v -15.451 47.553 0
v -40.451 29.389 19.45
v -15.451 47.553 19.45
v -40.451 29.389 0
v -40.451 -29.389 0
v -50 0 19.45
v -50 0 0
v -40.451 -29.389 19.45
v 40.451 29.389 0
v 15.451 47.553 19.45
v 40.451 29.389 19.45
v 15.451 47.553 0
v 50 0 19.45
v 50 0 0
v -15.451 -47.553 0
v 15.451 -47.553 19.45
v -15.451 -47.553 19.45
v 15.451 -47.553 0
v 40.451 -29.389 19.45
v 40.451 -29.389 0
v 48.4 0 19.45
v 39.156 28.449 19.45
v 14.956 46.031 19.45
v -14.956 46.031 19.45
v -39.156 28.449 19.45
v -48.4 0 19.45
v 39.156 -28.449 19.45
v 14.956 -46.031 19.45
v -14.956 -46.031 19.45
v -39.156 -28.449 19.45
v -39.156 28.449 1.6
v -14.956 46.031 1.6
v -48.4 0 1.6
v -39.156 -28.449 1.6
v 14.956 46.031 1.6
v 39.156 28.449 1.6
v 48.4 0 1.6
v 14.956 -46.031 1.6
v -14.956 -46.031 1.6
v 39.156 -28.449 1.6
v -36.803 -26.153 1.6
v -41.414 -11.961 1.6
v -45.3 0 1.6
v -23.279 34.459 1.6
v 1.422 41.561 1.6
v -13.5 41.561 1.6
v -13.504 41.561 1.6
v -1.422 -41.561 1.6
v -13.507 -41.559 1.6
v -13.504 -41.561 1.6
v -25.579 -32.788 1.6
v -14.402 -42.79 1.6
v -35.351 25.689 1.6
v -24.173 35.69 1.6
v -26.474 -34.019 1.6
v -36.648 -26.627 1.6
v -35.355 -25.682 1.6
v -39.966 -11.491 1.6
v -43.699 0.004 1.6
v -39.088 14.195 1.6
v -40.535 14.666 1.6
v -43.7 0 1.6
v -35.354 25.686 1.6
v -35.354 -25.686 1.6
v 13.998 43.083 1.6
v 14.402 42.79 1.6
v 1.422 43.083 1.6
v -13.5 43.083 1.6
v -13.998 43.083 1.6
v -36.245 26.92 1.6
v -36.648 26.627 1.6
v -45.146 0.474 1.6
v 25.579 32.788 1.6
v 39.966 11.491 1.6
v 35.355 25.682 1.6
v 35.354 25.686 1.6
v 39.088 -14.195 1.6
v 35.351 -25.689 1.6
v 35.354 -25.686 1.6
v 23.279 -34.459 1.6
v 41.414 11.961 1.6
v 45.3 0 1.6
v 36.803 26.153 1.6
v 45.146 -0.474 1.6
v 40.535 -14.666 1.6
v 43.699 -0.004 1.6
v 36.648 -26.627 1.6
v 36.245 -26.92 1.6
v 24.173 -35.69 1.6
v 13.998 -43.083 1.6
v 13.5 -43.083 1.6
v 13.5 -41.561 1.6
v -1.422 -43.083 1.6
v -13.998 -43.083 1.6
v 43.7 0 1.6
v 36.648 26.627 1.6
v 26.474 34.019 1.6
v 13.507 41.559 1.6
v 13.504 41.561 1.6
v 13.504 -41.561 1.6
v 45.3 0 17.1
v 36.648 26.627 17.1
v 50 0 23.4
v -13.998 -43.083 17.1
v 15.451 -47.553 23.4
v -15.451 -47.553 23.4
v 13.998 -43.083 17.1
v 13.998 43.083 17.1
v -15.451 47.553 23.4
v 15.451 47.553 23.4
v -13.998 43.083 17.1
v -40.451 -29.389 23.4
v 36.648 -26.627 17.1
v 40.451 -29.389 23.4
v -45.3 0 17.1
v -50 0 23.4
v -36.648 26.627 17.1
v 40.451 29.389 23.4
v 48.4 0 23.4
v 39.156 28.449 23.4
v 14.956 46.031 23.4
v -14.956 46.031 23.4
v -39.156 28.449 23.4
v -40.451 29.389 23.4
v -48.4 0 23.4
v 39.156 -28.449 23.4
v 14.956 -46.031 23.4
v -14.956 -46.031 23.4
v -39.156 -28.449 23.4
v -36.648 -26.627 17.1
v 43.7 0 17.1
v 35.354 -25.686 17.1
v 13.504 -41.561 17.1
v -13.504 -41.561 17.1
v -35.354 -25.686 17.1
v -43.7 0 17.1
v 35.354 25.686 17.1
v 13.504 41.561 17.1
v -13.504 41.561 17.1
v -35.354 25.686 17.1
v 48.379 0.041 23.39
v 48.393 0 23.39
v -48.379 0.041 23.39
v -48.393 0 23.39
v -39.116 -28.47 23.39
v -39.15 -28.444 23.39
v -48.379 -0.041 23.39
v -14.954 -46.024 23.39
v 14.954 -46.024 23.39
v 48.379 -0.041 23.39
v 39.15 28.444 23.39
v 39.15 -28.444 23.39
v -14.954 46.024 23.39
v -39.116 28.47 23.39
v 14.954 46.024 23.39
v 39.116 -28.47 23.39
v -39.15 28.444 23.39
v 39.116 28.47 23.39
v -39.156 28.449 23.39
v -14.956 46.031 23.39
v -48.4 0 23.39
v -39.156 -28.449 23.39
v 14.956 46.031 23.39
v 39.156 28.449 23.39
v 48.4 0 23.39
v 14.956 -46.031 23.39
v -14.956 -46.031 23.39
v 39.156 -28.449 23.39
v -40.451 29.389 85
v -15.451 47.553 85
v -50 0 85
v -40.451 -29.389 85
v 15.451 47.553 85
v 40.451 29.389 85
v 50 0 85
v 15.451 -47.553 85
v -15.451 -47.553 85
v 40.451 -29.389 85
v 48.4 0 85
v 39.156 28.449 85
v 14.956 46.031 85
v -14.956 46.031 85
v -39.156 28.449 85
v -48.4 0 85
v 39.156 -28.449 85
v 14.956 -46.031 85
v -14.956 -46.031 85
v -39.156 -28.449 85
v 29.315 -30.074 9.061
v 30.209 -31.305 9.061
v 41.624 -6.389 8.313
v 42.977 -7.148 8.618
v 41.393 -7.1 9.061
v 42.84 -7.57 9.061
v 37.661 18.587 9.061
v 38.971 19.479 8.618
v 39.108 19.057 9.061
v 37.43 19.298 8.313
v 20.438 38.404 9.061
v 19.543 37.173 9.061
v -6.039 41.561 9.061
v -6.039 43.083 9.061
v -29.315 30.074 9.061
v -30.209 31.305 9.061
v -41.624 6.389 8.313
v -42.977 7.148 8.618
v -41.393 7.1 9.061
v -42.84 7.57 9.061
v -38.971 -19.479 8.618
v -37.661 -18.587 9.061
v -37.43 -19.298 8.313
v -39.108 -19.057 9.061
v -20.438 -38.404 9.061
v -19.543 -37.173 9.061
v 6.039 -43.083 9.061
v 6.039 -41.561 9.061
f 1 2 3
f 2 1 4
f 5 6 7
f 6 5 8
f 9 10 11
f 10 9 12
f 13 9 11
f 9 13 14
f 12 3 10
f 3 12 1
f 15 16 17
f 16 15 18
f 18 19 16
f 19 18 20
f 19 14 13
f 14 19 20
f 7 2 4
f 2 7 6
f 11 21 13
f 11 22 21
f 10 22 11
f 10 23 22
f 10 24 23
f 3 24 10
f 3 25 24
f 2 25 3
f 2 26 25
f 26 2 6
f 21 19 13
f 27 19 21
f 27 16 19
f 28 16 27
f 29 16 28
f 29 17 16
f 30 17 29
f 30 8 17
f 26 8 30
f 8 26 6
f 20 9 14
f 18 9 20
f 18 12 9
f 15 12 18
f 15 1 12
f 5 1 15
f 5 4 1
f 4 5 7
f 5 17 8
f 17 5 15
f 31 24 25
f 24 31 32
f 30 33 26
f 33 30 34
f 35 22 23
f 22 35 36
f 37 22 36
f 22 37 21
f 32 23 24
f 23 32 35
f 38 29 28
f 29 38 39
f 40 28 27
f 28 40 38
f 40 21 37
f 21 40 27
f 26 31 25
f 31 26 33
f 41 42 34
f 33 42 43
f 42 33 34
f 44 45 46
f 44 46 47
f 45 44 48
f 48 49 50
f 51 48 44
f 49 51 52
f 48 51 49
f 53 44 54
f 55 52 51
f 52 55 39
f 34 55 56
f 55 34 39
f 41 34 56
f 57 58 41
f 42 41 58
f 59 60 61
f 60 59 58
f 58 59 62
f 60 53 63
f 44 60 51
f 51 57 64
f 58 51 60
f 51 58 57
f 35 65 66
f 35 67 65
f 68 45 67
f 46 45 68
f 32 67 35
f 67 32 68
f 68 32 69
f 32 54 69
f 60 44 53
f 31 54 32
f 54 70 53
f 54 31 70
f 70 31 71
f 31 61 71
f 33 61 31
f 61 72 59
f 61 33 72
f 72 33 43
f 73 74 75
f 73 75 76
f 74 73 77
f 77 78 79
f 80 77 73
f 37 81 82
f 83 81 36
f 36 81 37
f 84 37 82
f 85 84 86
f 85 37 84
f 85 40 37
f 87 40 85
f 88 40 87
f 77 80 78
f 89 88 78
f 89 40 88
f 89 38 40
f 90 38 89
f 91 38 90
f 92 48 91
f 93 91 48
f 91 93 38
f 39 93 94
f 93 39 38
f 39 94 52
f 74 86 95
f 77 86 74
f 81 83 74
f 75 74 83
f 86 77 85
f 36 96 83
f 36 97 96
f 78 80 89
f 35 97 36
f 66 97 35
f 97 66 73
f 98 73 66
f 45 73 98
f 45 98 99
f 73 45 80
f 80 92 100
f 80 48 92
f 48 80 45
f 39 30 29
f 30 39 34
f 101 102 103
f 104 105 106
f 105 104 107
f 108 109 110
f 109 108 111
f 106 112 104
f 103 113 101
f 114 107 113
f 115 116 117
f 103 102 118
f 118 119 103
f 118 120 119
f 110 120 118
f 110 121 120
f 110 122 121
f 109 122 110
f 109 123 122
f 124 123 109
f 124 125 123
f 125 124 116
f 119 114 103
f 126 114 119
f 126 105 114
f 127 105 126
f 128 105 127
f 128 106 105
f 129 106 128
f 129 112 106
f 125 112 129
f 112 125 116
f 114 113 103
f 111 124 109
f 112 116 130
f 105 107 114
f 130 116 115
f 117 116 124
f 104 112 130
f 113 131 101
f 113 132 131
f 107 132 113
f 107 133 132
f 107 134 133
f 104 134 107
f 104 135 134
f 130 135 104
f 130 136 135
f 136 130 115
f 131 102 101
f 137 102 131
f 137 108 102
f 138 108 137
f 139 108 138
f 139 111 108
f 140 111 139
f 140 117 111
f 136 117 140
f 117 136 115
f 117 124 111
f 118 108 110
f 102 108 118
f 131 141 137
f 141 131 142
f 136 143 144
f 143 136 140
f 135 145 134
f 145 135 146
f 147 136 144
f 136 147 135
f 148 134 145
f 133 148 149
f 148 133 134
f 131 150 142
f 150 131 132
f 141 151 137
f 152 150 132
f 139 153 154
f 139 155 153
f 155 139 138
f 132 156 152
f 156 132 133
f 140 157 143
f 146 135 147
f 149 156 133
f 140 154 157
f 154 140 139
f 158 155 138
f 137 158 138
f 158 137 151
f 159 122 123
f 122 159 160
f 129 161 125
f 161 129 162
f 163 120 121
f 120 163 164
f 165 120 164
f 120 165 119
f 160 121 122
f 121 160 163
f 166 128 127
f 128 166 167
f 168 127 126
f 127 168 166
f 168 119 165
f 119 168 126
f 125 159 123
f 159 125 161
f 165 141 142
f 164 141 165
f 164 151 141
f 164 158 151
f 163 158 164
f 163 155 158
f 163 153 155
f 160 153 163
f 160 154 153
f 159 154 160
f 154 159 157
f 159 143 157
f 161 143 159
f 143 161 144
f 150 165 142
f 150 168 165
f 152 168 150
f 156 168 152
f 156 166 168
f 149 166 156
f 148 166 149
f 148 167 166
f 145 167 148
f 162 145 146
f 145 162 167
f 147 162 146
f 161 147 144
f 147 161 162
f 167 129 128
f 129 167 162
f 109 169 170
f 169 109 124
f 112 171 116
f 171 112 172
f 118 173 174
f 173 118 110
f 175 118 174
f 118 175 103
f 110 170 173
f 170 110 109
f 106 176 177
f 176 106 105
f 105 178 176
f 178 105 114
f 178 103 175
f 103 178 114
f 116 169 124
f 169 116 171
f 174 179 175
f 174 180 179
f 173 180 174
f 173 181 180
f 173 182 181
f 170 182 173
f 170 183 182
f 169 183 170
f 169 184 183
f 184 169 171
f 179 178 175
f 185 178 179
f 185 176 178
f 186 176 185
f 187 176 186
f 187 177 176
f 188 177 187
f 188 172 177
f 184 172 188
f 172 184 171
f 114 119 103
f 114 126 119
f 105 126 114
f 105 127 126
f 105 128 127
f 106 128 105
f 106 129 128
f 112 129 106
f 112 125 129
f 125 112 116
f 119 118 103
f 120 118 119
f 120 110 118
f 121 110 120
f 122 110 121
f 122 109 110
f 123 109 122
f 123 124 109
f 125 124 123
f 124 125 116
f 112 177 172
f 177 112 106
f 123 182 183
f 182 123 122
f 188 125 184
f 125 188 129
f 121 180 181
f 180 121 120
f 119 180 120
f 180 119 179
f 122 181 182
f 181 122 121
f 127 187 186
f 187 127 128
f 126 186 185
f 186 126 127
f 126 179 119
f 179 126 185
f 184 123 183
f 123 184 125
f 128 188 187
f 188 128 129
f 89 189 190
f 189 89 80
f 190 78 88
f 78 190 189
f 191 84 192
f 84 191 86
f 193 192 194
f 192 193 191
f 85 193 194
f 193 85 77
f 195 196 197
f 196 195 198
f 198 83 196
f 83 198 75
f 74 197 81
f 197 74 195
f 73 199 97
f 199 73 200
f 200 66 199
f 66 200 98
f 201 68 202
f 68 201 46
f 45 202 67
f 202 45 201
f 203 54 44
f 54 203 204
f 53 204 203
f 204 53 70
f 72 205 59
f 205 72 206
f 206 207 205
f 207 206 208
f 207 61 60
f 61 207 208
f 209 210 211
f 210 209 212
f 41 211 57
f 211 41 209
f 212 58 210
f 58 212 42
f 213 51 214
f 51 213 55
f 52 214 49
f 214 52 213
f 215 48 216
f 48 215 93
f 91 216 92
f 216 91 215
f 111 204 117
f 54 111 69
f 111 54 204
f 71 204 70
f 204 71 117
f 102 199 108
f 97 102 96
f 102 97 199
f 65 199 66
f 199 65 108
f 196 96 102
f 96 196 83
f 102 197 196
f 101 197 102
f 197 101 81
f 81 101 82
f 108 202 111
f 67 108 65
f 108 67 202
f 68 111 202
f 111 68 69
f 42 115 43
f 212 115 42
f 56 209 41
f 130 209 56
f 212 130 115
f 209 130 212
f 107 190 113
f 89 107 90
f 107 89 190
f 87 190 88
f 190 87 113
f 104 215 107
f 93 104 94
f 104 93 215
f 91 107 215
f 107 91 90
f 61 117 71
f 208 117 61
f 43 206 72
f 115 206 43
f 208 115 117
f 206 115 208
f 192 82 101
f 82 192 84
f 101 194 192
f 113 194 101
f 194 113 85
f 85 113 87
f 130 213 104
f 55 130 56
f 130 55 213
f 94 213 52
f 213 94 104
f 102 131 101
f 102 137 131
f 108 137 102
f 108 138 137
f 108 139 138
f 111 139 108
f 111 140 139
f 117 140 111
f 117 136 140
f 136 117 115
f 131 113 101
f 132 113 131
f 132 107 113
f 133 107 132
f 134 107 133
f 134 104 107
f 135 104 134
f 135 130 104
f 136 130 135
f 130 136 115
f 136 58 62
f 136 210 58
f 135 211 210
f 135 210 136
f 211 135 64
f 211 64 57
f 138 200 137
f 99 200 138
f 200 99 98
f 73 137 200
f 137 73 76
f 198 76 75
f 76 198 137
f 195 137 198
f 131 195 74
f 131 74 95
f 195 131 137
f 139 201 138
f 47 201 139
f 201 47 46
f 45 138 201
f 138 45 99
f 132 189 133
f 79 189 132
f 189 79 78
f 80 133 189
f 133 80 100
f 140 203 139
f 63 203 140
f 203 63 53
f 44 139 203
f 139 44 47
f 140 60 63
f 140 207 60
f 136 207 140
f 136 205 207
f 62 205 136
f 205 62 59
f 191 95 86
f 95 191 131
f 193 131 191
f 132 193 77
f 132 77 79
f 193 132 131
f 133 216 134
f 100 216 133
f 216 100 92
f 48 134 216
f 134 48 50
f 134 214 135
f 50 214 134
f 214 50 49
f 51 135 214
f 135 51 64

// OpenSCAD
// Adapted from http://www.thingiverse.com/thing:211643

// all measurments in mm
height = 85;
radius = 100 / 2;
thick = 1.6;

// number of sides. Set to something like 200 for a round pot.
res = 10;

// Saucer try height proportion; Try .15 - .3
sHeight = .21;

// Saucer gap (in mm)
sGap = 1.5;

// Number of drain holes. 
numDrains = 8;

// For non-round pots, the number of drains should == res.
nDrain = res<=12 ? res : numDrains;

offset = thick*2 + sGap;
h2 = (height * sHeight) + thick;
h3 = h2 + (offset/2) + thick;
h1 = h3 - offset - thick;
r1 = radius - offset;

faceOS = 0.01;
faceOS2 = faceOS * 2;
drainH_Hold = (h1 - 2) * 1.414;

drainH = drainH_Hold < 5 ? 5 : drainH_Hold;

union(){
  base();
  taper();
  top();
  drain();
}

module drain(){
	difference(){
		cylinder(h = h1, r1 = r1, r2 = r1, $fn = res);
	
		translate([0,0,-faceOS]) 
			cylinder(h = h1 + faceOS2, r1 = r1 - thick, r2 = r1 - thick, $fn = res);
   	
		for( i = [1:nDrain]){
			rotate([90,0,(360/nDrain) * (i + ((nDrain - 2) % 4) * 0.25) ]) 
				translate([0,(-.707*drainH),0]) 
					rotate([0,0,45]) 
						cube([drainH,drainH*.6,r1]);
    }
	}
}

module base(){
	difference(){
		cylinder(h = h2, r1 = radius, r2 = radius, $fn = res);
		translate([0,0,thick]) 
			cylinder(h = h2+.1, r1 = radius - thick, r2 = radius - thick, $fn = res);
  }
}


module top(){
	difference(){
		translate([0,0,h3]) 
			cylinder(h = height - h3, r1 = radius, r2 = radius, $fn = res);

		translate([0,0,h3-.1]) 
			cylinder(h = (height - h3) + 1.1, r1 = radius - thick, r2 = radius - thick, $fn = res);
  }
}

module taper(){
	translate([0,0,h1]){
    difference(){
      cylinder(h = h3-h1, r1 = r1,    r2 = radius,    $fn = res);
      cylinder(h = h3-h1, r1 = r1-thick, r2 = radius-thick, $fn = res);
      translate([0,0,h3 - h1 - faceOS]) 
        cylinder(h = 1, r1 = radius-thick, r2 = radius-thick, $fn = res);
      translate([0,0,-faceOS]) 
        cylinder(h = faceOS2, r1 = r1-thick, r2 = r1-thick, $fn = res);
    }
  }
}
